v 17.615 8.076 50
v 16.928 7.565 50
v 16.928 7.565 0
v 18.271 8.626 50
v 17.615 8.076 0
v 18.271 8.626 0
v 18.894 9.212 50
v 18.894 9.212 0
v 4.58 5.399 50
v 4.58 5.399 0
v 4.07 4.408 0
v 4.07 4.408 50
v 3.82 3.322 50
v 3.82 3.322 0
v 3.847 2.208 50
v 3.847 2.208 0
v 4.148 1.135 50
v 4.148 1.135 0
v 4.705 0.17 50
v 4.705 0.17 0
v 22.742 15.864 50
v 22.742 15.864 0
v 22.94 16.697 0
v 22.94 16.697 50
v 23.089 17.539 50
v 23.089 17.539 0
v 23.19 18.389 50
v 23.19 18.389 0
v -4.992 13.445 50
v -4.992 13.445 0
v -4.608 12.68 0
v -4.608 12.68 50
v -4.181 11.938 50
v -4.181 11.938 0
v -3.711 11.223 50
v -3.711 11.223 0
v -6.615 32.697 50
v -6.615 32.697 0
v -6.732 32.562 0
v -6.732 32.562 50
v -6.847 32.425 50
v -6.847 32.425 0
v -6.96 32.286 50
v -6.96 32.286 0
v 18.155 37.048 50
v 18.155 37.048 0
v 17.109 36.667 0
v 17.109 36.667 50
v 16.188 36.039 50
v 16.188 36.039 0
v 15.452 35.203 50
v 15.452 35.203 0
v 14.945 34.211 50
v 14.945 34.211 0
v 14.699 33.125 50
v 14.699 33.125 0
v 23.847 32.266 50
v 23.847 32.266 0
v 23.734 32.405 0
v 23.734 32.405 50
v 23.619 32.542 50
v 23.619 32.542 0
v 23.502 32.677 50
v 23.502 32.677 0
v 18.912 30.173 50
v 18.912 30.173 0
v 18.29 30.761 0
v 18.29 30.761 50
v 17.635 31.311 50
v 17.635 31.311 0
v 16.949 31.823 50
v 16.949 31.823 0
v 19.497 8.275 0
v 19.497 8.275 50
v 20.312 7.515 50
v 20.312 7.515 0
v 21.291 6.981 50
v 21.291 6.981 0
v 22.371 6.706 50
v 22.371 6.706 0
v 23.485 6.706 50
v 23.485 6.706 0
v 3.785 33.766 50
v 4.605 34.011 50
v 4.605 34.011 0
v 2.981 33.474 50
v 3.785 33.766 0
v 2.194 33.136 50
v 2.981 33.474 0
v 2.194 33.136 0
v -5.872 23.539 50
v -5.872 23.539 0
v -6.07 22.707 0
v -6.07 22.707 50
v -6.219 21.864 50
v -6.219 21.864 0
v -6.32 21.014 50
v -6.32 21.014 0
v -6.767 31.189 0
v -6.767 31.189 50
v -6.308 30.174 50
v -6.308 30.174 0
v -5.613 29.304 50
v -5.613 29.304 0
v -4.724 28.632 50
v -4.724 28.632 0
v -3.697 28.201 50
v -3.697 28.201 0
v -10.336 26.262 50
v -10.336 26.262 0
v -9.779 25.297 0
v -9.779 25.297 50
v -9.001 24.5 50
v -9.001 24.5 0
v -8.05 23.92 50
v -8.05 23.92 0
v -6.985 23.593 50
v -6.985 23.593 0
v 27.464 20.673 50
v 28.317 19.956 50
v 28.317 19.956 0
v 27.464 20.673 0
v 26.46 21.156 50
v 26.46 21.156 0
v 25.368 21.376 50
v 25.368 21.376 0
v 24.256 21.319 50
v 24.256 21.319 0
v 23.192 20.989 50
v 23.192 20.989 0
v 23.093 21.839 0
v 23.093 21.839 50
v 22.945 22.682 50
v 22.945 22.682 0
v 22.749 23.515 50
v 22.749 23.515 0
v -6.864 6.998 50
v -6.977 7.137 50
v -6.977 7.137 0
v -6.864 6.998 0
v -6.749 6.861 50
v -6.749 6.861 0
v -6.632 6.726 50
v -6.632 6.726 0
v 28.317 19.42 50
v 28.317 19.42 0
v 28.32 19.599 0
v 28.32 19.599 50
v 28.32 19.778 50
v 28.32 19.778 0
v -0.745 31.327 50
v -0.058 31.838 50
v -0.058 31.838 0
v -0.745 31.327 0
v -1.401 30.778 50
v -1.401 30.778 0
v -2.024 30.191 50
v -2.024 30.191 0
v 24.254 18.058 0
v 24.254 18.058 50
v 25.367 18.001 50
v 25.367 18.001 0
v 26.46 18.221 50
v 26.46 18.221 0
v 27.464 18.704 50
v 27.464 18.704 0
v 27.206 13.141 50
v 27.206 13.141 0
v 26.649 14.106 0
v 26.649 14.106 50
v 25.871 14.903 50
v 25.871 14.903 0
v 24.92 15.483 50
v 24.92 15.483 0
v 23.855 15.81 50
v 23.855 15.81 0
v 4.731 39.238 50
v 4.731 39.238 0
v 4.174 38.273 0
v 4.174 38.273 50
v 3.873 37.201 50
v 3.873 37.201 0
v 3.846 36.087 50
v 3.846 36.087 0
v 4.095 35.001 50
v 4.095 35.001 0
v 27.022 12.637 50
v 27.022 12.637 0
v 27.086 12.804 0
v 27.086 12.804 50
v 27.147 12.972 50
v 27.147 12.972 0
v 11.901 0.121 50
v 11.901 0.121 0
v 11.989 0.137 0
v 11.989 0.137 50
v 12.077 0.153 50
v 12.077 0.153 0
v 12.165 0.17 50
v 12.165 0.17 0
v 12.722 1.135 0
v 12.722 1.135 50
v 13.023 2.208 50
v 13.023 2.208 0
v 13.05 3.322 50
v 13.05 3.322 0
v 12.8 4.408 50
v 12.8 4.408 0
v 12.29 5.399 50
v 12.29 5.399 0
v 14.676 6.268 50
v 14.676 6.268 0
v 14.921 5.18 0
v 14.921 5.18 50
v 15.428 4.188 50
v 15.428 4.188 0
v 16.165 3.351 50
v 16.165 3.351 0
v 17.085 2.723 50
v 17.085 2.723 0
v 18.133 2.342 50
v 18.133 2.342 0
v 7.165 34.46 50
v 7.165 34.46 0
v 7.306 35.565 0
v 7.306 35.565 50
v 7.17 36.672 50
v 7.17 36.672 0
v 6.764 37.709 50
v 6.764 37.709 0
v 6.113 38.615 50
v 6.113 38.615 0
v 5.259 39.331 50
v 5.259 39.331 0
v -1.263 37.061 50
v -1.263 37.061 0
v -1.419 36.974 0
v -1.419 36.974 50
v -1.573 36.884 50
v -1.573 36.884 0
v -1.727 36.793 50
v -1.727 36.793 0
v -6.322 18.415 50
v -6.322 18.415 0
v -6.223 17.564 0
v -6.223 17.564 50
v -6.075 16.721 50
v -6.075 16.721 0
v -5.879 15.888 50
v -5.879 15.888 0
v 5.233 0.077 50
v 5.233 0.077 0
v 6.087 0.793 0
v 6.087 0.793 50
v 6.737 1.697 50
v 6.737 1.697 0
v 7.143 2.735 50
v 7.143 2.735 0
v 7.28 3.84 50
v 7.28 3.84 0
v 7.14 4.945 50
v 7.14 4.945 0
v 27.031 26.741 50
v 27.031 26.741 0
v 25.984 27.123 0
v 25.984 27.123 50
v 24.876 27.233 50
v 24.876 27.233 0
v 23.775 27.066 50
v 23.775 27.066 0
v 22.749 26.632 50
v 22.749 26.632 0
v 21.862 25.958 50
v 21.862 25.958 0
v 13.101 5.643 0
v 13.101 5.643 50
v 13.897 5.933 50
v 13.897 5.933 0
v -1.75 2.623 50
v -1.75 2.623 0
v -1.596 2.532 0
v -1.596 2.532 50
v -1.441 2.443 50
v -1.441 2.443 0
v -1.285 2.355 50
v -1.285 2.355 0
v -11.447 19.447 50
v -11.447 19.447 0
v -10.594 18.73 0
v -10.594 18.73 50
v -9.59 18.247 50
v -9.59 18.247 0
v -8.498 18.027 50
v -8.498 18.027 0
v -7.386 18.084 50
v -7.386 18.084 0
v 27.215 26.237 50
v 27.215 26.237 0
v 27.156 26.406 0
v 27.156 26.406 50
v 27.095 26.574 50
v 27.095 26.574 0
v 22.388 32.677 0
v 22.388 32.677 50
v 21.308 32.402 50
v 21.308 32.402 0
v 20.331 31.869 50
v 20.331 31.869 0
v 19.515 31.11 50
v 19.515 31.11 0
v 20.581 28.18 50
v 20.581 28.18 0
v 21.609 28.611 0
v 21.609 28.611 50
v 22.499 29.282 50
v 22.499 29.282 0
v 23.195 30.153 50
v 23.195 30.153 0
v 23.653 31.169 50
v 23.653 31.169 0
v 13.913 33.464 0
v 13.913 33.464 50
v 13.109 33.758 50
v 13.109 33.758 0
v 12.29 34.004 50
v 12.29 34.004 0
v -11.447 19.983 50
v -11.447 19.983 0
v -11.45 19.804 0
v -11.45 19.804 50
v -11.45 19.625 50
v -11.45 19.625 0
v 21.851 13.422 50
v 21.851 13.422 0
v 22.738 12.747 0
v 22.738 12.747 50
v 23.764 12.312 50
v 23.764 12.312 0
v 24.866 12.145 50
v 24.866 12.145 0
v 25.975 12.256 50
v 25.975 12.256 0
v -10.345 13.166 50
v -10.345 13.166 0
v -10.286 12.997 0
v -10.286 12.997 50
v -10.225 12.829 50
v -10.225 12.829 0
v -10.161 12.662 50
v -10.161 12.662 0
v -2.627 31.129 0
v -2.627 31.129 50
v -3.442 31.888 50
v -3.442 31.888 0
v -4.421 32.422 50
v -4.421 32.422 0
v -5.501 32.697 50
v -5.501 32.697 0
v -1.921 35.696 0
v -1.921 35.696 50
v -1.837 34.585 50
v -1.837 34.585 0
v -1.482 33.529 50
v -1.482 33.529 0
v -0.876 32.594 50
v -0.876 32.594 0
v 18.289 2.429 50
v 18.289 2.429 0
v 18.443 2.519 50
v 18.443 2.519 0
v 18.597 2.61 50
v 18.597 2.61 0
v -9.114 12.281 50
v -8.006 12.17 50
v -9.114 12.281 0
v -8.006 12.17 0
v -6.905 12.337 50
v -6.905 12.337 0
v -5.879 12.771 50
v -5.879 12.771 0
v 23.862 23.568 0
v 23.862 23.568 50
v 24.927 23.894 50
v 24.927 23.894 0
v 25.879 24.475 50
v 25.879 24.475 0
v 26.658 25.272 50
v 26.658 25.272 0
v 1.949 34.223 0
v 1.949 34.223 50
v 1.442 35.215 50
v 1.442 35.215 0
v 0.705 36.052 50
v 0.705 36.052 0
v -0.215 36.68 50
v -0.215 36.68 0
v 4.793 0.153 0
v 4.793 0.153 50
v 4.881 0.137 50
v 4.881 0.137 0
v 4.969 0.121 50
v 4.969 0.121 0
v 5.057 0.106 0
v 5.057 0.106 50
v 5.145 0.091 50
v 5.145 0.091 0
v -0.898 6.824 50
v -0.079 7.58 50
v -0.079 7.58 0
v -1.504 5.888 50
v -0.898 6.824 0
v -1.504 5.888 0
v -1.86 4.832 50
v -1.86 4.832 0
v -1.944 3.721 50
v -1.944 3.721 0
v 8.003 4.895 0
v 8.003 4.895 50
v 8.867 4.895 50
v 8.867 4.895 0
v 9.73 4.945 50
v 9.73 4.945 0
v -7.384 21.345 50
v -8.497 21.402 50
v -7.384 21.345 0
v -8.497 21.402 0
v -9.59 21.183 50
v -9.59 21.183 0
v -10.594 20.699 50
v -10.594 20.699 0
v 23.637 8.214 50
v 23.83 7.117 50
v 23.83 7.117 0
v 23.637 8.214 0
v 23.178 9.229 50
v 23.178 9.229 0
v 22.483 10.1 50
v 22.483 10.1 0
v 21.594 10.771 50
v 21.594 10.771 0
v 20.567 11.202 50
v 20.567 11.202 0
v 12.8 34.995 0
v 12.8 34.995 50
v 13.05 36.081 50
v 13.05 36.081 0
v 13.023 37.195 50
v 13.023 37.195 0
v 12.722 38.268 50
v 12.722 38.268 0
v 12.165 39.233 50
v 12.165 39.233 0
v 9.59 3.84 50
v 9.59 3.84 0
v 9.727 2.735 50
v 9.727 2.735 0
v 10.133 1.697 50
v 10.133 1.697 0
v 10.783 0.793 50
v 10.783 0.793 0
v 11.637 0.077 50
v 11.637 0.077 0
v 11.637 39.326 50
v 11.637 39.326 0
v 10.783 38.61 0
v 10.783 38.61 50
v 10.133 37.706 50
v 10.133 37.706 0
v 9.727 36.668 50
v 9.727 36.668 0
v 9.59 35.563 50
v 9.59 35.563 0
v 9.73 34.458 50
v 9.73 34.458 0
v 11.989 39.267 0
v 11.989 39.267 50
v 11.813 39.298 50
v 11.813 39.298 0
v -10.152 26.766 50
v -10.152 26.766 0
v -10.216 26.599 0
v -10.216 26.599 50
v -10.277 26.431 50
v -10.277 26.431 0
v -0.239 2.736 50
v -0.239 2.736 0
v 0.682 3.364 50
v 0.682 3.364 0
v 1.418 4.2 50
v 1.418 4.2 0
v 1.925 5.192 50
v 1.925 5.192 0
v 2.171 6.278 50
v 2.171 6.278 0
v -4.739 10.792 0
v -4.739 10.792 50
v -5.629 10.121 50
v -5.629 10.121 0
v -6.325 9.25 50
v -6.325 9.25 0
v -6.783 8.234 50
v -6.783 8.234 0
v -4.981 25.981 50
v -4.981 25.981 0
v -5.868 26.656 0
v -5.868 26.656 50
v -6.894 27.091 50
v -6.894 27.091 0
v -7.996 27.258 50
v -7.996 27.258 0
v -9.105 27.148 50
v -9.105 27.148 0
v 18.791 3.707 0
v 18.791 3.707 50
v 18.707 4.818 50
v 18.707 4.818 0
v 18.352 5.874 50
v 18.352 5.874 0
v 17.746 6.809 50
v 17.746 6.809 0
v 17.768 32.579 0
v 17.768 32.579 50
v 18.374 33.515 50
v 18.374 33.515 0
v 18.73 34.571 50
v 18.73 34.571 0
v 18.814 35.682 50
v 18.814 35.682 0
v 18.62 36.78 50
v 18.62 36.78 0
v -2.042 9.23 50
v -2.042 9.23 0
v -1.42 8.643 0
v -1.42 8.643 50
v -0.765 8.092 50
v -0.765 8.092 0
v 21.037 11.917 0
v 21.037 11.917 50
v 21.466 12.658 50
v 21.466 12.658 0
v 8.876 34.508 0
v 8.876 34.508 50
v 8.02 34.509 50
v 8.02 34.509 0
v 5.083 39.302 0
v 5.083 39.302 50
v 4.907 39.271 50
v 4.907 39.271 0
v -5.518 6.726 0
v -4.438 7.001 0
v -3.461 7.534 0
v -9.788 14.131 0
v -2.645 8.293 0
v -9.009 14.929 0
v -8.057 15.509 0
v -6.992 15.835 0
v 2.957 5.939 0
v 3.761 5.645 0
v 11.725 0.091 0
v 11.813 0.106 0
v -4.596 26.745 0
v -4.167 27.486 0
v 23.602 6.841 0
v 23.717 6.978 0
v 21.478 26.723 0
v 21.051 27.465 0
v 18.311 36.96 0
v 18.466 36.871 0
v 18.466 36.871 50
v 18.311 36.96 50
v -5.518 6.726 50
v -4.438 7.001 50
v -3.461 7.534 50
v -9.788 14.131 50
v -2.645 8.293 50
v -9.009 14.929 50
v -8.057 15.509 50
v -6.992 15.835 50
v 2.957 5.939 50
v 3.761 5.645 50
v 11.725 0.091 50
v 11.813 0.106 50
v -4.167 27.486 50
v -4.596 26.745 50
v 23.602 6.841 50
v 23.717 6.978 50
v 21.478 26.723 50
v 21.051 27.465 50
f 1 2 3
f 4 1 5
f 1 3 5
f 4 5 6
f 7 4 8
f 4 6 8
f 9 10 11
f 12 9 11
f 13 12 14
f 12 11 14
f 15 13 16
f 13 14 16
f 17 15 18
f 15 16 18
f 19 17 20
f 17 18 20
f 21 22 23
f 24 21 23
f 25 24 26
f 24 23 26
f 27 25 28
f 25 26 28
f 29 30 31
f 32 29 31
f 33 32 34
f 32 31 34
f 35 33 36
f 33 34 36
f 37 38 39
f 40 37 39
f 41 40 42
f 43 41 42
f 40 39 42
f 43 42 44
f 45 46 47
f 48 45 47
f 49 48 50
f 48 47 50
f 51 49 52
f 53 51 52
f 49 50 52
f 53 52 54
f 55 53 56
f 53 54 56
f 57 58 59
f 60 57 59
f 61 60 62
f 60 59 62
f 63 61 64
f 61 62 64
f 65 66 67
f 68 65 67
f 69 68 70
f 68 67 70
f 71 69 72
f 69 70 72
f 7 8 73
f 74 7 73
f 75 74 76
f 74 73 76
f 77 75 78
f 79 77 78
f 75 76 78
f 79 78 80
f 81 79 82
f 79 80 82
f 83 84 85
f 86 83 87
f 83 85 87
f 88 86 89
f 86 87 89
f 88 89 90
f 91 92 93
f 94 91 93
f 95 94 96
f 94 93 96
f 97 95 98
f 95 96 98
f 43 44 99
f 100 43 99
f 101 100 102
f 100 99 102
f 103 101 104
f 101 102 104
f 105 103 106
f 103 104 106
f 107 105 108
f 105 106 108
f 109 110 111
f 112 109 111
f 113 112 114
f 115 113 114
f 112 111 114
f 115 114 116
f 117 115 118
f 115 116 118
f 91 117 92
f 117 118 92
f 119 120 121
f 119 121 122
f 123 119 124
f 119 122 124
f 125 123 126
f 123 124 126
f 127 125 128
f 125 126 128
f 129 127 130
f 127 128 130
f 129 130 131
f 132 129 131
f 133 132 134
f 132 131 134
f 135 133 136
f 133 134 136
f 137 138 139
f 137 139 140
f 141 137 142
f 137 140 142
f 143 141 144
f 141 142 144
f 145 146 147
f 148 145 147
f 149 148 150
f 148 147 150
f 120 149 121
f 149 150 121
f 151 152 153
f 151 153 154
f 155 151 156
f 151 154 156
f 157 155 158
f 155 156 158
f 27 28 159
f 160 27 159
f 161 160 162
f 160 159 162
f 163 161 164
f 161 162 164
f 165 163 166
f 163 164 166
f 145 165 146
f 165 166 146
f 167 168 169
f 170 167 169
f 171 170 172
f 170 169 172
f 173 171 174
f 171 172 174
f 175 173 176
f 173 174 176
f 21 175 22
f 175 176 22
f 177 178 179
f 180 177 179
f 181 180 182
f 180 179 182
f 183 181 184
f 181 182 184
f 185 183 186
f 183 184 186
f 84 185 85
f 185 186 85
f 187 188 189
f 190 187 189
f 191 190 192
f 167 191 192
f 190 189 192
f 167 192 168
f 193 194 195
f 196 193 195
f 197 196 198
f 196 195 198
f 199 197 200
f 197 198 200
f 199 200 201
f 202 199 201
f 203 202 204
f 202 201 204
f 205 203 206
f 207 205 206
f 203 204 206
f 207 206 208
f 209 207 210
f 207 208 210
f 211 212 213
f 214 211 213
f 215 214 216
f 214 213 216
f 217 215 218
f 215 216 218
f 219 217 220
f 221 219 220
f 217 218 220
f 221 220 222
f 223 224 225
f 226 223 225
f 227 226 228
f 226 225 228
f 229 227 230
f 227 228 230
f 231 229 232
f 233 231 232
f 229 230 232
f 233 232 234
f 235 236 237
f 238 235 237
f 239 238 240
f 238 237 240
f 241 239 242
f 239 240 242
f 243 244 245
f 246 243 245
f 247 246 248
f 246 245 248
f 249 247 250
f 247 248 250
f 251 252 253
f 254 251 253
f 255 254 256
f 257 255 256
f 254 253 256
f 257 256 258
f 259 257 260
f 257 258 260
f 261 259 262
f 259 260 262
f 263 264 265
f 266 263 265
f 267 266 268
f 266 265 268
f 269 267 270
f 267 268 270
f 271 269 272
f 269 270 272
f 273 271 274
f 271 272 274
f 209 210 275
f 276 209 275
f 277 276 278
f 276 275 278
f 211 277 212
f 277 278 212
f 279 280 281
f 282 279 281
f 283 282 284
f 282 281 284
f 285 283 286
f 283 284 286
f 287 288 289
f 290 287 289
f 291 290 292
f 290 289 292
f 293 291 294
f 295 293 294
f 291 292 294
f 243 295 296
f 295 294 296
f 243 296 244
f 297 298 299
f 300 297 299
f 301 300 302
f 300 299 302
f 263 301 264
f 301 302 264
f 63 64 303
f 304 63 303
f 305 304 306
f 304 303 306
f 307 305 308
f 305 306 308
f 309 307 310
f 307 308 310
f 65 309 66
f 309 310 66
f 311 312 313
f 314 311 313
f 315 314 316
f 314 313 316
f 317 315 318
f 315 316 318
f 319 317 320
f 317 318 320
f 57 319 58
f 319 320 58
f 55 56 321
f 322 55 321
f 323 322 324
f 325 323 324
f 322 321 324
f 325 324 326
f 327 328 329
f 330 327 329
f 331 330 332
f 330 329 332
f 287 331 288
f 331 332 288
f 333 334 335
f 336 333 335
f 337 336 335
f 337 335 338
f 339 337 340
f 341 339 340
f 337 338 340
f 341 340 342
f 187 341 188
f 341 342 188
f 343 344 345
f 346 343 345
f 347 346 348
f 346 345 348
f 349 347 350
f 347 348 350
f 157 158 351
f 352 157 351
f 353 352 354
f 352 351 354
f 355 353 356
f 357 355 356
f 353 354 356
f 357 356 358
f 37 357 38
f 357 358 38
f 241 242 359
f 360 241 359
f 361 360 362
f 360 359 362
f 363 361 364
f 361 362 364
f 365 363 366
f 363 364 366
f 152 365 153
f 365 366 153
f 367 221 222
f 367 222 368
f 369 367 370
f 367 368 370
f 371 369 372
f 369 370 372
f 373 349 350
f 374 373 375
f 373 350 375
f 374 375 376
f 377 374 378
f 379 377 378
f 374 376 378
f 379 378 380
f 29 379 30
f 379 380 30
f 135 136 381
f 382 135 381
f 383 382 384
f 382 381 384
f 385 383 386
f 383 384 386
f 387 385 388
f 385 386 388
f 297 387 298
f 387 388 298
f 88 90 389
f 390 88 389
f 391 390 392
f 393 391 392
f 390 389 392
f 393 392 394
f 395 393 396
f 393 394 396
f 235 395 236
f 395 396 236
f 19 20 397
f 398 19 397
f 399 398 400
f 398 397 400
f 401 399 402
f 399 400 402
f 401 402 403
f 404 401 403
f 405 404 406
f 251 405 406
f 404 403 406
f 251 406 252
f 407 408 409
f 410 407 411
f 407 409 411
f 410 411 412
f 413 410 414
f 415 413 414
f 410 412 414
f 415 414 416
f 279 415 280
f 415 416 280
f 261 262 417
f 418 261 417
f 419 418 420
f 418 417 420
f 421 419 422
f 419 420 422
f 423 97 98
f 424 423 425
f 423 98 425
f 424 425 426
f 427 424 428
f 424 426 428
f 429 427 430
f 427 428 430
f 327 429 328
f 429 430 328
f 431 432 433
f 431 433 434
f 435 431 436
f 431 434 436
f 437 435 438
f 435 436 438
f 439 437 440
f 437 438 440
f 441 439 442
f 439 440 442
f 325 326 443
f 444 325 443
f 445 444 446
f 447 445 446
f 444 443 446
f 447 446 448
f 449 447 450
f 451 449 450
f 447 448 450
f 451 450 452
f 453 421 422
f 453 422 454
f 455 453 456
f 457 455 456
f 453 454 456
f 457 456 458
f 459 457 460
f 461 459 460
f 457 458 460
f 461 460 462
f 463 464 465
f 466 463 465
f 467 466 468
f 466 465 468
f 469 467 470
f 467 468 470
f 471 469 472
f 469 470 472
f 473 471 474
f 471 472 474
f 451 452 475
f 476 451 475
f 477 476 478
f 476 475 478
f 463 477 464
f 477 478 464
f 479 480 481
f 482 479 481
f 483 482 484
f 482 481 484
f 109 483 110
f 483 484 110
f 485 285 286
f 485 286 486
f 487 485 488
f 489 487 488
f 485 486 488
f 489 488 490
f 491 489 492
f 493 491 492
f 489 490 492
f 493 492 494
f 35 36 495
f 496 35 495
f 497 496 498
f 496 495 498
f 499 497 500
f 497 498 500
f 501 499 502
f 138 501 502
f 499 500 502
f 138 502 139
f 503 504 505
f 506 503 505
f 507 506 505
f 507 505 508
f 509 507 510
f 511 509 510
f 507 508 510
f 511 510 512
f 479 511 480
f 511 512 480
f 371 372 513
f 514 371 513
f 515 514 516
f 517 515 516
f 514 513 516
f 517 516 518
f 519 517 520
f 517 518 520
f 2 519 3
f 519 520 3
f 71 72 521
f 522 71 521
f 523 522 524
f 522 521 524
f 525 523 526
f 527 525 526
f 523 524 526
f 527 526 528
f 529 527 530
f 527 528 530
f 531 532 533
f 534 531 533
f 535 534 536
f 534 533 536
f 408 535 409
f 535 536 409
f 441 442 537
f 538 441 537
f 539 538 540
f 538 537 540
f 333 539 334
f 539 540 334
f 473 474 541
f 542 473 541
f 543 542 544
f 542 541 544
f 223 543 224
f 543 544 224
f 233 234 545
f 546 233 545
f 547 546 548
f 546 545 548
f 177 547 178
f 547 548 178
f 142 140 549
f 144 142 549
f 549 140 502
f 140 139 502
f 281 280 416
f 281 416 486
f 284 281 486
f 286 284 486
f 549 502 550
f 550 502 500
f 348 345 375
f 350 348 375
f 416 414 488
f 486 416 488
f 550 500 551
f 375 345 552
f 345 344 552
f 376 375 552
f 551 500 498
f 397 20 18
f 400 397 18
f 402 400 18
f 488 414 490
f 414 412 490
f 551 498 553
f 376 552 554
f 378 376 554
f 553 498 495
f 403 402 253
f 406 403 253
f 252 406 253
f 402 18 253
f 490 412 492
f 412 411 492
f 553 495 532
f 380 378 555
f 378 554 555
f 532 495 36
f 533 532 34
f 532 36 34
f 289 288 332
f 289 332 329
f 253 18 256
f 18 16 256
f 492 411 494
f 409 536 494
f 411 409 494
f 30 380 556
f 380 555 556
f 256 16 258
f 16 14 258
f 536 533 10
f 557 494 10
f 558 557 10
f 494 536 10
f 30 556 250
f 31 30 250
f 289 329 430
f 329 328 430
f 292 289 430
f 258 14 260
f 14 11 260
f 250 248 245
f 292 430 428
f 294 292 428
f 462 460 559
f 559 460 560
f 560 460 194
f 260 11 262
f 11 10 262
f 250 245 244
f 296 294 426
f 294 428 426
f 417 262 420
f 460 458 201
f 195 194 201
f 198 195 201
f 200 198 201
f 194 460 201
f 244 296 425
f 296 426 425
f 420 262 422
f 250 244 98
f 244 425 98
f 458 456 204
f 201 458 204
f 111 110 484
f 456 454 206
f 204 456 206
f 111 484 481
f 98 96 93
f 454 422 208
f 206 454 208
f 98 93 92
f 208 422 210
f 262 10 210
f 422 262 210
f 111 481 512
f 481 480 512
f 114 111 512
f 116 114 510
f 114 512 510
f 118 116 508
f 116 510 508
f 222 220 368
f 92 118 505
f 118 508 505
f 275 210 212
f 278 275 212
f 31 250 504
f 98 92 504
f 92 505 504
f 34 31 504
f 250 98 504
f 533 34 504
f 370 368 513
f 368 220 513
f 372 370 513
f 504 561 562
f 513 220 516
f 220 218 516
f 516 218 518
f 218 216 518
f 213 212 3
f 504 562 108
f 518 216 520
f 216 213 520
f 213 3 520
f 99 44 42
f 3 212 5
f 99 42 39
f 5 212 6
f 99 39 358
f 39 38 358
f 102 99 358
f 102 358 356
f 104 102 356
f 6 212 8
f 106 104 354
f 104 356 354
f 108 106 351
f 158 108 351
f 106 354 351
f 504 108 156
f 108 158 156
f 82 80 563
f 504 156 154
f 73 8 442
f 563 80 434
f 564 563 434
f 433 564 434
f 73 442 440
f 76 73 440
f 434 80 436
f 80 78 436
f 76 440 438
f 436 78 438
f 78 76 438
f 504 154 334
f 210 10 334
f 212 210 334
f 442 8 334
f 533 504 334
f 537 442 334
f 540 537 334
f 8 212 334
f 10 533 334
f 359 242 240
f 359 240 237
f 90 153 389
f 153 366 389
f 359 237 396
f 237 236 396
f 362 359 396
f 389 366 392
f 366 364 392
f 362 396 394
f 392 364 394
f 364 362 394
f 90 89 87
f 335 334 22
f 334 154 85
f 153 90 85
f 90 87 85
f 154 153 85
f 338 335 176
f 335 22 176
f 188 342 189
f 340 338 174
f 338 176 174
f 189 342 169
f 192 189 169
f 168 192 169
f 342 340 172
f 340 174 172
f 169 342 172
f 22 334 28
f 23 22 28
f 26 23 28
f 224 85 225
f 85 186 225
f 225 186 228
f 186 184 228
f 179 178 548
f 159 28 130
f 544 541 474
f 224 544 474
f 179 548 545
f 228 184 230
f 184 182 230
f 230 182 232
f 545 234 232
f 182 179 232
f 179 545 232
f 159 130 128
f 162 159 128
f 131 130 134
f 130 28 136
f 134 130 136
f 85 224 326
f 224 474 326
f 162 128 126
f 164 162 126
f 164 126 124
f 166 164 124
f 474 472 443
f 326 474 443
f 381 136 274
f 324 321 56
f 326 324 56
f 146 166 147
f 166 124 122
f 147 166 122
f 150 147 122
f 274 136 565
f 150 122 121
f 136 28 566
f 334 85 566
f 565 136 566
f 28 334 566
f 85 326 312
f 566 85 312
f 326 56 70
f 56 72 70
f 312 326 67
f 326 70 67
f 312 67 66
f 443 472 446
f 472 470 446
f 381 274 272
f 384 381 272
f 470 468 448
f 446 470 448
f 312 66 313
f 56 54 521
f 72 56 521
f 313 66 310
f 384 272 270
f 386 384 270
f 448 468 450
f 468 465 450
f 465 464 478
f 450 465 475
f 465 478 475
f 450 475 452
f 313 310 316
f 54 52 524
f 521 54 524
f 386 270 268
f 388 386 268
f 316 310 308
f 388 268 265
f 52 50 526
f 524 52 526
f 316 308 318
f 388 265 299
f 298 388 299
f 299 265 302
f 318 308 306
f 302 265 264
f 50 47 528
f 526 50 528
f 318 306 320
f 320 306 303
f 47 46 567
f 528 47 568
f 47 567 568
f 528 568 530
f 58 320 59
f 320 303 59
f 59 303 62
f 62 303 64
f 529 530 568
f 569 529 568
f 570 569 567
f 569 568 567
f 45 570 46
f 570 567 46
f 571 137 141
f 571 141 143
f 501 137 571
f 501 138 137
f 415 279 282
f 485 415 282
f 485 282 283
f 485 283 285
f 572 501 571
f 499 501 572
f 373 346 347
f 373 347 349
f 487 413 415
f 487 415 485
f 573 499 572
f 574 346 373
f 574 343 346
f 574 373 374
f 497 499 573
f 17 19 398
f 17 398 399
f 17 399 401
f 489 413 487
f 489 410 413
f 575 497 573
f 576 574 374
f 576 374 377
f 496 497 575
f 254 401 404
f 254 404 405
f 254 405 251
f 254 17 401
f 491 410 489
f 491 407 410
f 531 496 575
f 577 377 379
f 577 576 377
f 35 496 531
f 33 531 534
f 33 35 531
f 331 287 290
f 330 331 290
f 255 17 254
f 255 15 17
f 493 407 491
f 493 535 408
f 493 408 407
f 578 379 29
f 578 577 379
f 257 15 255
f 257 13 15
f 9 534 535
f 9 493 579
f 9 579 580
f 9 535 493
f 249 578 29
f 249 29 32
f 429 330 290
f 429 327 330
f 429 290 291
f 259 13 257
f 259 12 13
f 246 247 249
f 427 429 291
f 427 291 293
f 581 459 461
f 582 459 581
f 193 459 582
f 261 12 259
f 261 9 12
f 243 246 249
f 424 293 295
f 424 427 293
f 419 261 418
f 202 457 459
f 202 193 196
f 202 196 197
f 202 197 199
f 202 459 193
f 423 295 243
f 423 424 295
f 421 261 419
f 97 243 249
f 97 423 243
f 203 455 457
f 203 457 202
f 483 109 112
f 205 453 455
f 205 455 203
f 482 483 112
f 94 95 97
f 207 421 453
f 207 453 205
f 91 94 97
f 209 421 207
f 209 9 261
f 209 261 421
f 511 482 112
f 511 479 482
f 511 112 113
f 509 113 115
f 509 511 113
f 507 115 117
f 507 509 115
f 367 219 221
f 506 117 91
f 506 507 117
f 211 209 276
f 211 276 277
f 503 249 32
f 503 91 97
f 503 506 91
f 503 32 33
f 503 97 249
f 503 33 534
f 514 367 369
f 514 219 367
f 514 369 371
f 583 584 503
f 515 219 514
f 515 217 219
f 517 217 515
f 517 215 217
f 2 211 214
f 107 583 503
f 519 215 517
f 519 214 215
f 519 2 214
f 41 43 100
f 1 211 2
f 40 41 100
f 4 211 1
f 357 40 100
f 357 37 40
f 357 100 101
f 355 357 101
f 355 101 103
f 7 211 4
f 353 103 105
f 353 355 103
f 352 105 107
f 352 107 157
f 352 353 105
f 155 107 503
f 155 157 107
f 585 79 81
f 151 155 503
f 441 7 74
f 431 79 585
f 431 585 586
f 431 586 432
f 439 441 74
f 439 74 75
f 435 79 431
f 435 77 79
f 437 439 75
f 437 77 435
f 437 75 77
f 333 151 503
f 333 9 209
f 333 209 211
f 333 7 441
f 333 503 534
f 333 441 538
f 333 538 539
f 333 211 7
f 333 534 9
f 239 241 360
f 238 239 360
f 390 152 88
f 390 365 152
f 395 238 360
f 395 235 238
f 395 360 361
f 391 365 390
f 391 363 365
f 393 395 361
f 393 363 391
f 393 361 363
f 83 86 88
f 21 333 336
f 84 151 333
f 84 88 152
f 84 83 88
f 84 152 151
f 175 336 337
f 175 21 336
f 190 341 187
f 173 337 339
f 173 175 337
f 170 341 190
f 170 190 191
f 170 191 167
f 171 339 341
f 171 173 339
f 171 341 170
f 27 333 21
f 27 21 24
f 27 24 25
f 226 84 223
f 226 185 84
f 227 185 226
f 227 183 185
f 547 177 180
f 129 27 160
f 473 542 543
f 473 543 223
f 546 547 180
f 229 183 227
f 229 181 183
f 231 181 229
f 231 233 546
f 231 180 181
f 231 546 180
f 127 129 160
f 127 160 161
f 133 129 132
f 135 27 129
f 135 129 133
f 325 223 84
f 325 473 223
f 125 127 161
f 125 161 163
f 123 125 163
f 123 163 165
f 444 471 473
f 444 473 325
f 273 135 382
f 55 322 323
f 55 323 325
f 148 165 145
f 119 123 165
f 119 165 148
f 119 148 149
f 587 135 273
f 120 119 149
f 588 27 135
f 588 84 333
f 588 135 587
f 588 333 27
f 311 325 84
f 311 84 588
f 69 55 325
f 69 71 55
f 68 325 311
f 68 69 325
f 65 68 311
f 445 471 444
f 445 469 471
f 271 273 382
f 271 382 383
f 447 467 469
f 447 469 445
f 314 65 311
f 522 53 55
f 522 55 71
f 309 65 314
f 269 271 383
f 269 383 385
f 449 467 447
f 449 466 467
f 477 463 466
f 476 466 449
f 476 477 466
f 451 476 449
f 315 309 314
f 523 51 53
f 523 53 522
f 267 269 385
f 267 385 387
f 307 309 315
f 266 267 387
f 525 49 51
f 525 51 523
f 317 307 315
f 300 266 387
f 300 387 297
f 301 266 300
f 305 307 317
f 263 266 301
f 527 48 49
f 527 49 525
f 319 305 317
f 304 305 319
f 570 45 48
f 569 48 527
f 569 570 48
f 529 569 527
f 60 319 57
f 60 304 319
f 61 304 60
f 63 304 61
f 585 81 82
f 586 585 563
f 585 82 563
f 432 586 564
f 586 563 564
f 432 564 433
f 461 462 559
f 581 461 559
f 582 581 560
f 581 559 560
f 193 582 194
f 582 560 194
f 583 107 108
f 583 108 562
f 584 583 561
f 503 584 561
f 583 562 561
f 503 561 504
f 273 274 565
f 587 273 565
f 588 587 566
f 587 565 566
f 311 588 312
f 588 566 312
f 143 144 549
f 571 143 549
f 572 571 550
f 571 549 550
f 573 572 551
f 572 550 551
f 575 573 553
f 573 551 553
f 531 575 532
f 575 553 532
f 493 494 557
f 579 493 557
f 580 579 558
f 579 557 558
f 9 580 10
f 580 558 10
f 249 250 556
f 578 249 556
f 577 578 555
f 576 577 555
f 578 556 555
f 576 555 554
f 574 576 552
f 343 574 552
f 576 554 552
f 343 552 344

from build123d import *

# Parameters (mm, degrees)
BOSS_EXTRUDE1_DEPTH = 50


with BuildPart() as part:
    # Sketch4 → Boss-Extrude1 (new body)
    with BuildSketch(Plane.XY):
        with BuildLine():
            ThreePointArc((4.968986099, 0.120803098), (5.101132242, 0.098182628), (5.233497909, 0.076884301))
            ThreePointArc((5.233497909, 0.076884301), (6.972697635, 2.203383358), (7.139946857, 4.945433981))
            ThreePointArc((7.139946857, 4.945433981), (8.434999235, 4.888713692), (9.730051613, 4.945433981))
            ThreePointArc((9.730051613, 4.945433981), (9.897300835, 2.203383358), (11.636500561, 0.076884301))
            ThreePointArc((11.636500561, 0.076884301), (11.768866228, 0.098182628), (11.901012371, 0.120803098))
            ThreePointArc((11.901012371, 0.120803098), (12.032925783, 0.144743452), (12.16459328, 0.170001296))
            ThreePointArc((12.16459328, 0.170001296), (13.0716304, 2.764324962), (12.289539875, 5.399010148))
            ThreePointArc((12.289539875, 5.399010148), (13.501291083, 5.782037637), (14.675751687, 6.26752022))
            ThreePointArc((14.675751687, 6.26752022), (15.77017858, 3.746516175), (18.132608433, 2.342181169))
            ThreePointArc((18.132608433, 2.342181169), (18.366147116, 2.473919706), (18.597005377, 2.61030087))
            ThreePointArc((18.597005377, 2.61030087), (18.562422416, 5.35722969), (16.927986588, 7.56526806))
            ThreePointArc((16.927986588, 7.56526806), (17.946753802, 8.346079322), (18.894100505, 9.212155005))
            ThreePointArc((18.894100505, 9.212155005), (20.784759544, 7.217502149), (23.485028304, 6.705857505))
            ThreePointArc((23.485028304, 6.705857505), (23.659425648, 6.909526169), (23.829716347, 7.116640718))
            ThreePointArc((23.829716347, 7.116640718), (22.857714006, 9.686081391), (20.566653119, 11.201948778))
            ThreePointArc((20.566653119, 11.201948778), (21.256927973, 12.284110268), (21.850927349, 13.421966851))
            ThreePointArc((21.850927349, 13.421966851), (24.309777153, 12.194249757), (27.022192556, 12.637007368))
            ThreePointArc((27.022192556, 12.637007368), (27.116413667, 12.888040714), (27.205597232, 13.140907576))
            ThreePointArc((27.205597232, 13.140907576), (25.413413337, 15.222947636), (22.742063147, 15.863808061))
            ThreePointArc((22.742063147, 15.863808061), (23.020588306, 17.116795131), (23.189595265, 18.389190318))
            ThreePointArc((23.189595265, 18.389190318), (25.920062258, 18.076489787), (28.317466974, 19.420246552))
            ThreePointArc((28.317466974, 19.420246552), (28.320147397, 19.688366252), (28.317466974, 19.956485953))
            ThreePointArc((28.317466974, 19.956485953), (25.921265354, 21.30000064), (23.191830118, 20.988556878))
            ThreePointArc((23.191830118, 20.988556878), (23.025011337, 22.261240797), (22.748641145, 23.514704949))
            ThreePointArc((22.748641145, 23.514704949), (25.42139071, 24.154737279), (27.21462235, 26.2374163))
            ThreePointArc((27.21462235, 26.2374163), (27.125438785, 26.490283162), (27.031217673, 26.741316508))
            ThreePointArc((27.031217673, 26.741316508), (24.320015606, 27.184258124), (21.861705497, 25.958074888))
            ThreePointArc((21.861705497, 25.958074888), (21.269663582, 27.096951192), (20.581250564, 28.180298033))
            ThreePointArc((20.581250564, 28.180298033), (22.873909658, 29.695865881), (23.84667802, 32.26626533))
            ThreePointArc((23.84667802, 32.26626533), (23.676387321, 32.473379879), (23.501989977, 32.677048544))
            ThreePointArc((23.501989977, 32.677048544), (20.802798446, 32.165991792), (18.912121943, 30.172964878))
            ThreePointArc((18.912121943, 30.172964878), (17.966265888, 31.040668276), (16.948842813, 31.82323019))
            ThreePointArc((16.948842813, 31.82323019), (18.584882913, 34.031533704), (18.619857777, 36.779625474))
            ThreePointArc((18.619857777, 36.779625474), (18.388999516, 36.916006638), (18.155460833, 37.047745174))
            ThreePointArc((18.155460833, 37.047745174), (15.793842173, 35.644331042), (14.698842765, 33.124848909))
            ThreePointArc((14.698842765, 33.124848909), (13.51325677, 33.616721566), (12.289539875, 34.004110035))
            ThreePointArc((12.289539875, 34.004110035), (13.0716304, 36.638795221), (12.16459328, 39.233118887))
            ThreePointArc((12.16459328, 39.233118887), (11.901012371, 39.282317085), (11.636500561, 39.326235881))
            ThreePointArc((11.636500561, 39.326235881), (9.897300835, 37.199736825), (9.730051613, 34.457686202))
            ThreePointArc((9.730051613, 34.457686202), (8.447734845, 34.514401016), (7.16532245, 34.459891274))
            ThreePointArc((7.16532245, 34.459891274), (6.99913174, 37.203176215), (5.259484699, 39.330818054))
            ThreePointArc((5.259484699, 39.330818054), (4.994972889, 39.286899257), (4.73139198, 39.237701059))
            ThreePointArc((4.73139198, 39.237701059), (3.824384344, 36.644604248), (4.605058031, 34.010716908))
            ThreePointArc((4.605058031, 34.010716908), (3.380676818, 33.625433236), (2.194246783, 33.135599963))
            ThreePointArc((2.194246783, 33.135599963), (1.09981989, 35.656604008), (-1.262609963, 37.060939014))
            ThreePointArc((-1.262609963, 37.060939014), (-1.496148646, 36.929200477), (-1.727006907, 36.792819313))
            ThreePointArc((-1.727006907, 36.792819313), (-1.692423946, 34.045890493), (-0.057988118, 31.837852122))
            ThreePointArc((-0.057988118, 31.837852122), (-1.076755332, 31.05704086), (-2.024102035, 30.190965178))
            ThreePointArc((-2.024102035, 30.190965178), (-3.914761075, 32.185618033), (-6.615029835, 32.697262678))
            ThreePointArc((-6.615029835, 32.697262678), (-6.789427179, 32.493594014), (-6.959717877, 32.286479465))
            ThreePointArc((-6.959717877, 32.286479465), (-5.987715536, 29.717038792), (-3.696654649, 28.201171405))
            ThreePointArc((-3.696654649, 28.201171405), (-4.386929503, 27.119009915), (-4.980928879, 25.981153332))
            ThreePointArc((-4.980928879, 25.981153332), (-7.439778683, 27.208870426), (-10.152194086, 26.766112815))
            ThreePointArc((-10.152194086, 26.766112815), (-10.246415197, 26.515079469), (-10.335598762, 26.262212607))
            ThreePointArc((-10.335598762, 26.262212607), (-8.543414868, 24.180172547), (-5.872064677, 23.539312122))
            ThreePointArc((-5.872064677, 23.539312122), (-6.150589836, 22.286325051), (-6.319596795, 21.013929865))
            ThreePointArc((-6.319596795, 21.013929865), (-9.050063788, 21.326630396), (-11.447468504, 19.982873631))
            ThreePointArc((-11.447468504, 19.982873631), (-11.450148927, 19.714753931), (-11.447468504, 19.44663423))
            ThreePointArc((-11.447468504, 19.44663423), (-9.051266884, 18.103119543), (-6.321831648, 18.414563305))
            ThreePointArc((-6.321831648, 18.414563305), (-6.155012867, 17.141879386), (-5.878642675, 15.888415234))
            ThreePointArc((-5.878642675, 15.888415234), (-8.55139224, 15.248382904), (-10.34462388, 13.165703883))
            ThreePointArc((-10.34462388, 13.165703883), (-10.255440315, 12.91283702), (-10.161219203, 12.661803675))
            ThreePointArc((-10.161219203, 12.661803675), (-7.450017136, 12.218862059), (-4.991707027, 13.445045295))
            ThreePointArc((-4.991707027, 13.445045295), (-4.399665112, 12.306168991), (-3.711252094, 11.222822149))
            ThreePointArc((-3.711252094, 11.222822149), (-6.003911188, 9.707254302), (-6.97667955, 7.136854852))
            ThreePointArc((-6.97667955, 7.136854852), (-6.806388851, 6.929740303), (-6.631991507, 6.726071639))
            ThreePointArc((-6.631991507, 6.726071639), (-3.932799977, 7.23712839), (-2.042123473, 9.230155305))
            ThreePointArc((-2.042123473, 9.230155305), (-1.096267418, 8.362451907), (-0.078844343, 7.579889993))
            ThreePointArc((-0.078844343, 7.579889993), (-1.714884443, 5.371586479), (-1.749859307, 2.623494709))
            ThreePointArc((-1.749859307, 2.623494709), (-1.519001046, 2.487113545), (-1.285462363, 2.355375008))
            ThreePointArc((-1.285462363, 2.355375008), (1.076156297, 3.758789141), (2.171155705, 6.278271274))
            ThreePointArc((2.171155705, 6.278271274), (3.3567417, 5.786398617), (4.580458595, 5.399010148))
            ThreePointArc((4.580458595, 5.399010148), (3.79836807, 2.764324962), (4.705405189, 0.170001296))
            ThreePointArc((4.705405189, 0.170001296), (4.837072687, 0.144743452), (4.968986099, 0.120803098))
        make_face()
    extrude(amount=BOSS_EXTRUDE1_DEPTH)


solid = part.part
